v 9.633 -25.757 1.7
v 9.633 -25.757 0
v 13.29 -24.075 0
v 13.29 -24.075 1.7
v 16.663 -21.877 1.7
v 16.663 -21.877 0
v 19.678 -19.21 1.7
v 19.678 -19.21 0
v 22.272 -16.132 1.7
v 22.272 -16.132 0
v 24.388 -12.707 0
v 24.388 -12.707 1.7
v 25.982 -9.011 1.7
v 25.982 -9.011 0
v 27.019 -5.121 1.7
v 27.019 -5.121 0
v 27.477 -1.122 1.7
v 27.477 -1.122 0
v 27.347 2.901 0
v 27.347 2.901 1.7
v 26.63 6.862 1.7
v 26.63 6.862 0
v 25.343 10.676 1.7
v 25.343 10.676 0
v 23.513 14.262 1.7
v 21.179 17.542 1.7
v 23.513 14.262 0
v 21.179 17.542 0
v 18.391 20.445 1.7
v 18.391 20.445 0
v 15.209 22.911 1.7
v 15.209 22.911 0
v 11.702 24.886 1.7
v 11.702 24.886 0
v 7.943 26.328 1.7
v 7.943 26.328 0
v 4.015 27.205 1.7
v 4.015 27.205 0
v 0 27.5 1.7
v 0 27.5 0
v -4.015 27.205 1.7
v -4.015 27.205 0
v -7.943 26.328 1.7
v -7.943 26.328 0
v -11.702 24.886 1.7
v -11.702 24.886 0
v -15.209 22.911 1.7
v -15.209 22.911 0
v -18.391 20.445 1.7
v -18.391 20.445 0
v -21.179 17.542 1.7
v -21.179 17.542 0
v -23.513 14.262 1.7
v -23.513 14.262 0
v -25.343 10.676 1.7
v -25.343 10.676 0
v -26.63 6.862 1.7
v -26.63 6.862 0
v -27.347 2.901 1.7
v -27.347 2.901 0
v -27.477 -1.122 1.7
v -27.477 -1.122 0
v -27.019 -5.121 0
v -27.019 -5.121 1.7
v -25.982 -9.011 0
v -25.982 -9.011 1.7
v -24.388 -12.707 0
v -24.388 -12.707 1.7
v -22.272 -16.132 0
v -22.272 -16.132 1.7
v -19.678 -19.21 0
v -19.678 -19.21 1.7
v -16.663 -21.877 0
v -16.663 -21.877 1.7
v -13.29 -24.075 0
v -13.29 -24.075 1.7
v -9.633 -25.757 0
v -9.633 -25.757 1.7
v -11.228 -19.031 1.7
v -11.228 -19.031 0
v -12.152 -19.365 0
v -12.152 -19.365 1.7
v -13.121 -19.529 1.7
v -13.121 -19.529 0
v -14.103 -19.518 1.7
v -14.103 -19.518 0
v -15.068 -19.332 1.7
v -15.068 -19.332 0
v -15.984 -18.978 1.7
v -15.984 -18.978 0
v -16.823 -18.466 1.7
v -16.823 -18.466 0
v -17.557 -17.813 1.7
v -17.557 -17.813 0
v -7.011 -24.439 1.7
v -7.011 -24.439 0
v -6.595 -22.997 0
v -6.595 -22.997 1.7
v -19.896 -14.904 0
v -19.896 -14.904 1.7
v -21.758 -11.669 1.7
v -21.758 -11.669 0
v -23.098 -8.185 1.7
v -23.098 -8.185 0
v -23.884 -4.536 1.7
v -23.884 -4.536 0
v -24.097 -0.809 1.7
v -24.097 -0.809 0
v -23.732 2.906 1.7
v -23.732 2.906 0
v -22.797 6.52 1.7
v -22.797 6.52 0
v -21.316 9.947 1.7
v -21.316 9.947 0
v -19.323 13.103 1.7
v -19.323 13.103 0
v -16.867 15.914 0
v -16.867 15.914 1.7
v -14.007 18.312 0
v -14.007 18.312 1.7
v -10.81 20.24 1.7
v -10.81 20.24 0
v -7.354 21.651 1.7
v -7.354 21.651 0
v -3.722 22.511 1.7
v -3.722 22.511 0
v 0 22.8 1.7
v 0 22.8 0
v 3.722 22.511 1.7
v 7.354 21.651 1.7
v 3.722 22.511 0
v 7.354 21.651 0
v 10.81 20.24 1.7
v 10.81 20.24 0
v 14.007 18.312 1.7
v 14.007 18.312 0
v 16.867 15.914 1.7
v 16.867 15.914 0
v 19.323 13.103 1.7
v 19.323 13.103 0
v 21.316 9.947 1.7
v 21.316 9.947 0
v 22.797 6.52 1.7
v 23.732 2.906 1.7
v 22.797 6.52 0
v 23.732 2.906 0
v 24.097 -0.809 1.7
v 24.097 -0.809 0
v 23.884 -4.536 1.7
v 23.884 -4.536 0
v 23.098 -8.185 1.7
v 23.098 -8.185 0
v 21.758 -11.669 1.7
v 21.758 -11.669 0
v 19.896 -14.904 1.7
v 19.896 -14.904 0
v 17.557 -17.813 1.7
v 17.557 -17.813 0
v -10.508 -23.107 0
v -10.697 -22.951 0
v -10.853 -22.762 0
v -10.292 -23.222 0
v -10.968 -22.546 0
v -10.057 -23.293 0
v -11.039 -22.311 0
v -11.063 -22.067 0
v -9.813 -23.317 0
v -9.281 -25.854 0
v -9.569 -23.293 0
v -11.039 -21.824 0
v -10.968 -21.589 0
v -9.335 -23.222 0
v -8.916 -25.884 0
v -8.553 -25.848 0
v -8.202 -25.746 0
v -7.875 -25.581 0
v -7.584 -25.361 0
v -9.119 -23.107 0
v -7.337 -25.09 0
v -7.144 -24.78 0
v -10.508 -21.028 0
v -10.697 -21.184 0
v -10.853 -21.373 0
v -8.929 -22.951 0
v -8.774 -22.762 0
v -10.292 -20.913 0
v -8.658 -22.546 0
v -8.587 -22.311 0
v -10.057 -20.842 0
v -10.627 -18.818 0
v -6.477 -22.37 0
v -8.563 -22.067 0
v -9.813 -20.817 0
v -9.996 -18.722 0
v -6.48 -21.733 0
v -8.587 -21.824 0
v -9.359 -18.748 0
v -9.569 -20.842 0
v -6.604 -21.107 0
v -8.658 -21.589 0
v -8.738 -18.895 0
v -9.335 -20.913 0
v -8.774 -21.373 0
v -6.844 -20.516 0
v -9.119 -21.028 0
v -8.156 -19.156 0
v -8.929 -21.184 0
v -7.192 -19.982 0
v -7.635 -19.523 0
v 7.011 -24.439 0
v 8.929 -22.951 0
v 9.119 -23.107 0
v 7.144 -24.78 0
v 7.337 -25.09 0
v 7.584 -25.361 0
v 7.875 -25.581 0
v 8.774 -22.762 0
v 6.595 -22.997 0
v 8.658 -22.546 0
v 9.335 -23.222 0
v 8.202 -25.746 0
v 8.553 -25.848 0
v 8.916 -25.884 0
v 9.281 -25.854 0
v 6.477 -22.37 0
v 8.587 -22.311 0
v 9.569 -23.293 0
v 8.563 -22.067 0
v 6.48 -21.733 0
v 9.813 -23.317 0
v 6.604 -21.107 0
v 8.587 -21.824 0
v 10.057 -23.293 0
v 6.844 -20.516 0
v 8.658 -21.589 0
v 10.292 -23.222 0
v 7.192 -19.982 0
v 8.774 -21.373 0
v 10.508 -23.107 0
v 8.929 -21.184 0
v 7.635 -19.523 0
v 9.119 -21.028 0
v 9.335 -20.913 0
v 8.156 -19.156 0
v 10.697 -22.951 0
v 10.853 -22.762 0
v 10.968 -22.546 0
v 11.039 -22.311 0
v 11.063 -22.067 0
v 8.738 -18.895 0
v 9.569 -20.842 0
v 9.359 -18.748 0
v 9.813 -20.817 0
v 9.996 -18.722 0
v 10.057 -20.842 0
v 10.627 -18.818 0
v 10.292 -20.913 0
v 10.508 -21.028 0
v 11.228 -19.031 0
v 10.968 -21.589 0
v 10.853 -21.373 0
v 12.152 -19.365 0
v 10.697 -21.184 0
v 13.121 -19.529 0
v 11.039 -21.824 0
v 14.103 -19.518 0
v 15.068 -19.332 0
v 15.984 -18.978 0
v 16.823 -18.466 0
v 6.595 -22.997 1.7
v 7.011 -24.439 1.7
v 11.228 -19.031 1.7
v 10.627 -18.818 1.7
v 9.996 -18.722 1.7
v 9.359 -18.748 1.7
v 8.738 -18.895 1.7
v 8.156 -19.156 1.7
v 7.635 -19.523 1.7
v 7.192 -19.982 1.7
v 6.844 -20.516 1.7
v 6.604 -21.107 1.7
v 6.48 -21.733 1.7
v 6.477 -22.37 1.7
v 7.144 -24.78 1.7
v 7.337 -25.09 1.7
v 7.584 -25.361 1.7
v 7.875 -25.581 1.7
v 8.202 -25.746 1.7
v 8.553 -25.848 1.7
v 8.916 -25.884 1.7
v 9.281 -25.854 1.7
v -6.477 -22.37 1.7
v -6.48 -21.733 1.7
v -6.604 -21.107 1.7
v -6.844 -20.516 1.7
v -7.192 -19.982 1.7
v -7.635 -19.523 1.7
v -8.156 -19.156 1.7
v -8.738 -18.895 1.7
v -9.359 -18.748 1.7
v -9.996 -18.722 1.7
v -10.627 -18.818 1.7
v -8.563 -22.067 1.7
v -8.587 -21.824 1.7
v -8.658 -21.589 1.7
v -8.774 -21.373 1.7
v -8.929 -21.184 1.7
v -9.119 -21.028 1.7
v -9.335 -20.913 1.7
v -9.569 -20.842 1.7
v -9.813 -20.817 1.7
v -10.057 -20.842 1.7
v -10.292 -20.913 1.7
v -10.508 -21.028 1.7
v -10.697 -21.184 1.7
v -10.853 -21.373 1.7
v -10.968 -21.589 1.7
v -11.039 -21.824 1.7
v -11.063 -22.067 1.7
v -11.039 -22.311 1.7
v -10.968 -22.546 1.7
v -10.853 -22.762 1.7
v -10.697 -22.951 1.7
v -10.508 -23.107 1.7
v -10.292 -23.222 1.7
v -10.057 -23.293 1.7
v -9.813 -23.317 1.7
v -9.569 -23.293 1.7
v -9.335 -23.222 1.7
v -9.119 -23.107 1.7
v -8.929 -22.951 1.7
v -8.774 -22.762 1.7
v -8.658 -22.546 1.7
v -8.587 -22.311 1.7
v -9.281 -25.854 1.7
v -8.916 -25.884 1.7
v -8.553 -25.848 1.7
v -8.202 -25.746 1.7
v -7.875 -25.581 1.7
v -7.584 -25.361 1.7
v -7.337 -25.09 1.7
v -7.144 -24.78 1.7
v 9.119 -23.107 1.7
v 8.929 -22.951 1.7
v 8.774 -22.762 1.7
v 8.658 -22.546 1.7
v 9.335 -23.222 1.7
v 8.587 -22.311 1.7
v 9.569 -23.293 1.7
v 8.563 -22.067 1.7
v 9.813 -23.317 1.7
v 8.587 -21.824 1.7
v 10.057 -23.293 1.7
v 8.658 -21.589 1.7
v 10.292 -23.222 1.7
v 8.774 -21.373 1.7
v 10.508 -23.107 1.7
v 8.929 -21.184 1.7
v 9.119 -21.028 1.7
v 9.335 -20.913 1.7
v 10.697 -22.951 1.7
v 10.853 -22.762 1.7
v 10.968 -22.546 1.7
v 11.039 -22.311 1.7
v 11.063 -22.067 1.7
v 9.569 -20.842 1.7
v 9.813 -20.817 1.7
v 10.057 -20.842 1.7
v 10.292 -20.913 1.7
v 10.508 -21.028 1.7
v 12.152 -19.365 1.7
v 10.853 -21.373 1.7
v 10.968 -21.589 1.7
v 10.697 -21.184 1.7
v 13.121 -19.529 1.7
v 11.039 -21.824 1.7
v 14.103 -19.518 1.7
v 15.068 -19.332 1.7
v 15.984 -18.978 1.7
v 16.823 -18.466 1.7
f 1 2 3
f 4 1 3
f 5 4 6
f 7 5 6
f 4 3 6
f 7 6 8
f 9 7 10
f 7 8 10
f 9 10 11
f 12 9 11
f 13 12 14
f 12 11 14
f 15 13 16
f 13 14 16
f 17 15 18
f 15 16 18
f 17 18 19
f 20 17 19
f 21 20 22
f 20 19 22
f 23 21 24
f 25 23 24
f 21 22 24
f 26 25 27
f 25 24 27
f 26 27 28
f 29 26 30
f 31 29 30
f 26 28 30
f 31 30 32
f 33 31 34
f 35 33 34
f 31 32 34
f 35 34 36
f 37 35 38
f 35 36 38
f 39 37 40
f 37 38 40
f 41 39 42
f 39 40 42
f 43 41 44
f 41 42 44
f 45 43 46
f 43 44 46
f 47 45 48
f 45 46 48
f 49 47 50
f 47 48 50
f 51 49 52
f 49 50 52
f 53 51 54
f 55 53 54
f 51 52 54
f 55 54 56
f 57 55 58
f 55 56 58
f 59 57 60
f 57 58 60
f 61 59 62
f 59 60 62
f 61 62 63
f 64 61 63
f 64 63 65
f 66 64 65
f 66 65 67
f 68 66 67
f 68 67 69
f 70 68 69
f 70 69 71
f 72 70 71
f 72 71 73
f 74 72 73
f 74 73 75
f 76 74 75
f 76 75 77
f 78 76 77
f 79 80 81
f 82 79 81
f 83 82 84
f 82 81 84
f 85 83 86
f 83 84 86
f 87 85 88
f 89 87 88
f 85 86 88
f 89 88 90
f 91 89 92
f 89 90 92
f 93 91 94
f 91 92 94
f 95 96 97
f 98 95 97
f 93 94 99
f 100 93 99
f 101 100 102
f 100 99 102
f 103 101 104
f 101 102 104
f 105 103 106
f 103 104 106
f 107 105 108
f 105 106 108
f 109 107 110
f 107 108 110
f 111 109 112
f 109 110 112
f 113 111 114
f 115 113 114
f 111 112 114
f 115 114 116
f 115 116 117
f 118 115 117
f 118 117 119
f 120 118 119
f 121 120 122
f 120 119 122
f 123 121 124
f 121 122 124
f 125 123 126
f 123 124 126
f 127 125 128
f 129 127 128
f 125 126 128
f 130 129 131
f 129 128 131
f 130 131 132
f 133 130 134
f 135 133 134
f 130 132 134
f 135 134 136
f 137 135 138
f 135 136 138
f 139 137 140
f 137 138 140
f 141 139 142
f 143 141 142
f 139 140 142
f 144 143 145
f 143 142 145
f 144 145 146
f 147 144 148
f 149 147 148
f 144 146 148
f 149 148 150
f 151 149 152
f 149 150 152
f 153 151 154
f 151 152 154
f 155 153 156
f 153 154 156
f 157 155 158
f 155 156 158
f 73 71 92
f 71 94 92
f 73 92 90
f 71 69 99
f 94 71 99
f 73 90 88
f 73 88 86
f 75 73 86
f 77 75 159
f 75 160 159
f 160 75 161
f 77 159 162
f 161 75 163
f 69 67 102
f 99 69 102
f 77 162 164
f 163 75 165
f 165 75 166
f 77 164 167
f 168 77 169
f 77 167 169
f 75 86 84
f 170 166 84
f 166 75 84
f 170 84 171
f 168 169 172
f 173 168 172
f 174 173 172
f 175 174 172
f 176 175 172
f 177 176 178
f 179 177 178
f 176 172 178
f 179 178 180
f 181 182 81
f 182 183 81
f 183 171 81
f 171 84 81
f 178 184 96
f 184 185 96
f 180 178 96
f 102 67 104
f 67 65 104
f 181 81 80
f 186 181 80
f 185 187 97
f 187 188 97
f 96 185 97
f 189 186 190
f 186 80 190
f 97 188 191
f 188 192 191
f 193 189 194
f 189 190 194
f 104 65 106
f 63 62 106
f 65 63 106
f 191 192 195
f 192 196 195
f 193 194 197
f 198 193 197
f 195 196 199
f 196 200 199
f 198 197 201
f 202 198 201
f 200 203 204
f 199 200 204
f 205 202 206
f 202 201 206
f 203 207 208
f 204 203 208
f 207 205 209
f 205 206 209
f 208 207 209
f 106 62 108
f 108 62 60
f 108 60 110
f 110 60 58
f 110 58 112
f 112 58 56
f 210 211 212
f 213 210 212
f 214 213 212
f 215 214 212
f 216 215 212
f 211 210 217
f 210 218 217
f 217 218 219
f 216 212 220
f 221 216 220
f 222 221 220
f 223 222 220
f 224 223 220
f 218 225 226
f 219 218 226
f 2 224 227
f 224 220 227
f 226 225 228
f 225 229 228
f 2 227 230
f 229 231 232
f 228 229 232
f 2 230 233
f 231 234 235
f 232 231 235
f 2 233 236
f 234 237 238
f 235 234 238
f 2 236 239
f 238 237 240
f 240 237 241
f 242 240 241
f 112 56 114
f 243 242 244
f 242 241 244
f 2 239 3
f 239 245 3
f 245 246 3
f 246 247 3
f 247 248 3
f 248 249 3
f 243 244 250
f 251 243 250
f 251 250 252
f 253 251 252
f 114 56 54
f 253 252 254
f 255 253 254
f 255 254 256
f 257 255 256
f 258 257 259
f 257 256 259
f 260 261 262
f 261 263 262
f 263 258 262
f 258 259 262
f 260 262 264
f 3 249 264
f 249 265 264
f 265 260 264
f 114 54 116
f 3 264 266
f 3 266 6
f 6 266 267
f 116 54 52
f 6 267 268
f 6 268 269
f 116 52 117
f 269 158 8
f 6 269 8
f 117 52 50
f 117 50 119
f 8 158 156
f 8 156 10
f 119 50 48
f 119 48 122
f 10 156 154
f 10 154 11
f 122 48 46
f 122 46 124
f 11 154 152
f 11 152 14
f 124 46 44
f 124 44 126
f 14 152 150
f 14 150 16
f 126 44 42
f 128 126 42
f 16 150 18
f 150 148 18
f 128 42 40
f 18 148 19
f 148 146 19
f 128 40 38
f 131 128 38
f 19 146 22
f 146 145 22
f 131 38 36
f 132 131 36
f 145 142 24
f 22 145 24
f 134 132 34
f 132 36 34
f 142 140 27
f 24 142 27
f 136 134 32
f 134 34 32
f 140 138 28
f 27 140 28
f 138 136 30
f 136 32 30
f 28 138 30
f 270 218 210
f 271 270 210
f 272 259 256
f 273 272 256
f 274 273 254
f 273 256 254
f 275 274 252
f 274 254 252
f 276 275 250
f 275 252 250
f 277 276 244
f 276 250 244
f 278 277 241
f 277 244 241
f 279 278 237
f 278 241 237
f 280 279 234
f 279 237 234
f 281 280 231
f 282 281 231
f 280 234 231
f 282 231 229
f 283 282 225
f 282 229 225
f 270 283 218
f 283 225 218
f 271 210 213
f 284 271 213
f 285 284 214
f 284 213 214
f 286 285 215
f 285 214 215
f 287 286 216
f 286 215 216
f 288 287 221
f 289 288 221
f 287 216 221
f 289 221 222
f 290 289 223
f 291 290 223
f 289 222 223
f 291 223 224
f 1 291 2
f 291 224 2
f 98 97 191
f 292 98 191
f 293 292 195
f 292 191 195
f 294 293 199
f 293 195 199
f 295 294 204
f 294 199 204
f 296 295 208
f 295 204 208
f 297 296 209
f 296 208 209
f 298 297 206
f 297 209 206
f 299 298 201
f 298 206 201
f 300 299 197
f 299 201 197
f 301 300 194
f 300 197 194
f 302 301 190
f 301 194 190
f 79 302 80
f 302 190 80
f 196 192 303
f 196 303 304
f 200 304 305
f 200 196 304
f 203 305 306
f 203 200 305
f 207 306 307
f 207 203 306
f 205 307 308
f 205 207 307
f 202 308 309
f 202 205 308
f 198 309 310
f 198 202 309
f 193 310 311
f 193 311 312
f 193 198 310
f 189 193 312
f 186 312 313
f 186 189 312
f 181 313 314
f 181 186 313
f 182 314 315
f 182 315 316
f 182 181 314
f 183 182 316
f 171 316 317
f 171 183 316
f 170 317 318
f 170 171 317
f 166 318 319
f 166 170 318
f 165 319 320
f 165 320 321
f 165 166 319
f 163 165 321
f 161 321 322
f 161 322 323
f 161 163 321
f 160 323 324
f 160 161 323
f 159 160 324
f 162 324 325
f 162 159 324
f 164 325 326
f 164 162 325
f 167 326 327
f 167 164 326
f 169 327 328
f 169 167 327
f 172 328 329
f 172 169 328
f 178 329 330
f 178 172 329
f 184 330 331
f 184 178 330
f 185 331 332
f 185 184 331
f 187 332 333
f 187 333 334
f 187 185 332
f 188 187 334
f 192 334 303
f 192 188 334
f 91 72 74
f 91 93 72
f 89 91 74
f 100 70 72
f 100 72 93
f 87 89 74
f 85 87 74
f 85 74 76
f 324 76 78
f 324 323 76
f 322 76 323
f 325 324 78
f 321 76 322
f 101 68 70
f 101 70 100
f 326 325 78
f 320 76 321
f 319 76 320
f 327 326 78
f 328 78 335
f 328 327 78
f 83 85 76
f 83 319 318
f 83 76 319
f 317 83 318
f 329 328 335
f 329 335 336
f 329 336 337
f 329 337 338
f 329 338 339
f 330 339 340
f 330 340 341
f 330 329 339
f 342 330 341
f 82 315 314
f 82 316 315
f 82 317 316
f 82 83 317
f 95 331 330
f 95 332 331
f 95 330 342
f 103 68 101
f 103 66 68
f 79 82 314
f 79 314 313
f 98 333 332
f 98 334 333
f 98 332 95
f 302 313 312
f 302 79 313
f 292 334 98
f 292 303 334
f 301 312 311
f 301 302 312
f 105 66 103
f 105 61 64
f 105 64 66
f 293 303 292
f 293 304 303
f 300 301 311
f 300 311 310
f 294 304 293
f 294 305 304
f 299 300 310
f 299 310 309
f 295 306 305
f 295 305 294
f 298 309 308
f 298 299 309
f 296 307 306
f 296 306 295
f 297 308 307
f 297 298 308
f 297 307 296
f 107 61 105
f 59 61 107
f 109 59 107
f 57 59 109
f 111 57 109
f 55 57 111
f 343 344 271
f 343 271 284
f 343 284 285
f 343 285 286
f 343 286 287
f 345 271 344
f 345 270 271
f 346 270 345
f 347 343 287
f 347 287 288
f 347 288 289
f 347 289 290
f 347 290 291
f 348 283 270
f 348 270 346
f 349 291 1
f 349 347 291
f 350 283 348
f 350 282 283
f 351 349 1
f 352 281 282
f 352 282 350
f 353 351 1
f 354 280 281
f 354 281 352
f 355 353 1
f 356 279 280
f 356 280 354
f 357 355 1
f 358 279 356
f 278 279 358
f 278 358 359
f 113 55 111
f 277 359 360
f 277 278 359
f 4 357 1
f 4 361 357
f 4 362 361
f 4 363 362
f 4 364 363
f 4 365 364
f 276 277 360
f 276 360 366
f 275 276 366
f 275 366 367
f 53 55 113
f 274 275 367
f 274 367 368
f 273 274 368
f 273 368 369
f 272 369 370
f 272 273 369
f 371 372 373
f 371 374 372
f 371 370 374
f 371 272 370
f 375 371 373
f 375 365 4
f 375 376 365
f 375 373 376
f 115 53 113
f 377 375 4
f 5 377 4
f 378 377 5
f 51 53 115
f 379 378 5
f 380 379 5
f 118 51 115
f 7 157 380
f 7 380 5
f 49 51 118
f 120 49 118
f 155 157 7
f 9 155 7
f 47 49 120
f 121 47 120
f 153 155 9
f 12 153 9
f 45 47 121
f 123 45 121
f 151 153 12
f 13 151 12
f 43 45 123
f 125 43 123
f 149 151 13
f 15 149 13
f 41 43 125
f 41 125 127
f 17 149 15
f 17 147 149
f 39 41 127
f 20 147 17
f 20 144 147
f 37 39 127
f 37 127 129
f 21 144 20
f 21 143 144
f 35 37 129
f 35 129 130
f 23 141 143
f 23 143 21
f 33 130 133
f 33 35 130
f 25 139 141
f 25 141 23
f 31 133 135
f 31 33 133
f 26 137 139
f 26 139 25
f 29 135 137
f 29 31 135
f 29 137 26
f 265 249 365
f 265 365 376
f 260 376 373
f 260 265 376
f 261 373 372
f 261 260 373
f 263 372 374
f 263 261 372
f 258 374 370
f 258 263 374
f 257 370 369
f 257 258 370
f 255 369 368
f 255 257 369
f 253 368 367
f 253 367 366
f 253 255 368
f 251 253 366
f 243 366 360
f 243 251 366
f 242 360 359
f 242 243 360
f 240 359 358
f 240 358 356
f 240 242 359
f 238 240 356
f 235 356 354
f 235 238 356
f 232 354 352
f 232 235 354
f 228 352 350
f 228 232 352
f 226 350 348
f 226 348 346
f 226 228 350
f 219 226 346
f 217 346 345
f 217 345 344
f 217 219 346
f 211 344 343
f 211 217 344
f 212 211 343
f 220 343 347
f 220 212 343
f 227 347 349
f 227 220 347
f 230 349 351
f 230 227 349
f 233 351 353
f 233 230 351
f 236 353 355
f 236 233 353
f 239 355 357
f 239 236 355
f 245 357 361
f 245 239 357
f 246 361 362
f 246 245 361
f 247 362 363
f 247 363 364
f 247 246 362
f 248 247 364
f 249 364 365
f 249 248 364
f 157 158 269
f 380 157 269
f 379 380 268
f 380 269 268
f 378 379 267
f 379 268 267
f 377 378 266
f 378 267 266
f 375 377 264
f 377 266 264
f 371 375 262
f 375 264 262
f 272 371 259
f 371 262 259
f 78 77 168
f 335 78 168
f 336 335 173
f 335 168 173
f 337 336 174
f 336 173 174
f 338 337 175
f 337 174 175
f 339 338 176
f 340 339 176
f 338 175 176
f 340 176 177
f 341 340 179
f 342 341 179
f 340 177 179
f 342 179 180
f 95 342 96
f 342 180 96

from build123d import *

# Parameters (mm, degrees)
SKETCH_3_R      = 1.25
EXTRUDE_1_DEPTH = 1.7


with BuildPart() as part:
    # Эскиз3 → Бобышка-Вытянуть1 (new body)
    with BuildSketch(Plane.XY):
        with BuildLine():
            Line((-7.01136277, -24.439204164), (-6.594823284, -22.997133444))
            ThreePointArc((-6.594823284, -22.997133444), (-7.634692218, -19.522622744), (-11.227983542, -19.030881496))
            ThreePointArc((-11.227983542, -19.030881496), (-14.589641394, -19.446371526), (-17.557236321, -17.813351066))
            ThreePointArc((-17.557236321, -17.813351066), (0, 22.8), (17.557236321, -17.813351066))
            ThreePointArc((17.557236321, -17.813351066), (14.589641394, -19.446371526), (11.227983542, -19.030881496))
            ThreePointArc((11.227983542, -19.030881496), (7.634692218, -19.522622744), (6.594823284, -22.997133444))
            Line((6.594823284, -22.997133444), (7.01136277, -24.439204164))
            ThreePointArc((7.01136277, -24.439204164), (8.034444052, -25.671075647), (9.633424702, -25.757467432))
            ThreePointArc((9.633424702, -25.757467432), (0, 27.5), (-9.633424702, -25.757467432))
            ThreePointArc((-9.633424702, -25.757467432), (-8.034444052, -25.671075647), (-7.01136277, -24.439204164))
        make_face()
        with Locations((-9.813250738, -22.067496567)):
            Circle(SKETCH_3_R, mode=Mode.SUBTRACT)
        with Locations((9.813250738, -22.067496567)):
            Circle(SKETCH_3_R, mode=Mode.SUBTRACT)
    extrude(amount=EXTRUDE_1_DEPTH)


solid = part.part
